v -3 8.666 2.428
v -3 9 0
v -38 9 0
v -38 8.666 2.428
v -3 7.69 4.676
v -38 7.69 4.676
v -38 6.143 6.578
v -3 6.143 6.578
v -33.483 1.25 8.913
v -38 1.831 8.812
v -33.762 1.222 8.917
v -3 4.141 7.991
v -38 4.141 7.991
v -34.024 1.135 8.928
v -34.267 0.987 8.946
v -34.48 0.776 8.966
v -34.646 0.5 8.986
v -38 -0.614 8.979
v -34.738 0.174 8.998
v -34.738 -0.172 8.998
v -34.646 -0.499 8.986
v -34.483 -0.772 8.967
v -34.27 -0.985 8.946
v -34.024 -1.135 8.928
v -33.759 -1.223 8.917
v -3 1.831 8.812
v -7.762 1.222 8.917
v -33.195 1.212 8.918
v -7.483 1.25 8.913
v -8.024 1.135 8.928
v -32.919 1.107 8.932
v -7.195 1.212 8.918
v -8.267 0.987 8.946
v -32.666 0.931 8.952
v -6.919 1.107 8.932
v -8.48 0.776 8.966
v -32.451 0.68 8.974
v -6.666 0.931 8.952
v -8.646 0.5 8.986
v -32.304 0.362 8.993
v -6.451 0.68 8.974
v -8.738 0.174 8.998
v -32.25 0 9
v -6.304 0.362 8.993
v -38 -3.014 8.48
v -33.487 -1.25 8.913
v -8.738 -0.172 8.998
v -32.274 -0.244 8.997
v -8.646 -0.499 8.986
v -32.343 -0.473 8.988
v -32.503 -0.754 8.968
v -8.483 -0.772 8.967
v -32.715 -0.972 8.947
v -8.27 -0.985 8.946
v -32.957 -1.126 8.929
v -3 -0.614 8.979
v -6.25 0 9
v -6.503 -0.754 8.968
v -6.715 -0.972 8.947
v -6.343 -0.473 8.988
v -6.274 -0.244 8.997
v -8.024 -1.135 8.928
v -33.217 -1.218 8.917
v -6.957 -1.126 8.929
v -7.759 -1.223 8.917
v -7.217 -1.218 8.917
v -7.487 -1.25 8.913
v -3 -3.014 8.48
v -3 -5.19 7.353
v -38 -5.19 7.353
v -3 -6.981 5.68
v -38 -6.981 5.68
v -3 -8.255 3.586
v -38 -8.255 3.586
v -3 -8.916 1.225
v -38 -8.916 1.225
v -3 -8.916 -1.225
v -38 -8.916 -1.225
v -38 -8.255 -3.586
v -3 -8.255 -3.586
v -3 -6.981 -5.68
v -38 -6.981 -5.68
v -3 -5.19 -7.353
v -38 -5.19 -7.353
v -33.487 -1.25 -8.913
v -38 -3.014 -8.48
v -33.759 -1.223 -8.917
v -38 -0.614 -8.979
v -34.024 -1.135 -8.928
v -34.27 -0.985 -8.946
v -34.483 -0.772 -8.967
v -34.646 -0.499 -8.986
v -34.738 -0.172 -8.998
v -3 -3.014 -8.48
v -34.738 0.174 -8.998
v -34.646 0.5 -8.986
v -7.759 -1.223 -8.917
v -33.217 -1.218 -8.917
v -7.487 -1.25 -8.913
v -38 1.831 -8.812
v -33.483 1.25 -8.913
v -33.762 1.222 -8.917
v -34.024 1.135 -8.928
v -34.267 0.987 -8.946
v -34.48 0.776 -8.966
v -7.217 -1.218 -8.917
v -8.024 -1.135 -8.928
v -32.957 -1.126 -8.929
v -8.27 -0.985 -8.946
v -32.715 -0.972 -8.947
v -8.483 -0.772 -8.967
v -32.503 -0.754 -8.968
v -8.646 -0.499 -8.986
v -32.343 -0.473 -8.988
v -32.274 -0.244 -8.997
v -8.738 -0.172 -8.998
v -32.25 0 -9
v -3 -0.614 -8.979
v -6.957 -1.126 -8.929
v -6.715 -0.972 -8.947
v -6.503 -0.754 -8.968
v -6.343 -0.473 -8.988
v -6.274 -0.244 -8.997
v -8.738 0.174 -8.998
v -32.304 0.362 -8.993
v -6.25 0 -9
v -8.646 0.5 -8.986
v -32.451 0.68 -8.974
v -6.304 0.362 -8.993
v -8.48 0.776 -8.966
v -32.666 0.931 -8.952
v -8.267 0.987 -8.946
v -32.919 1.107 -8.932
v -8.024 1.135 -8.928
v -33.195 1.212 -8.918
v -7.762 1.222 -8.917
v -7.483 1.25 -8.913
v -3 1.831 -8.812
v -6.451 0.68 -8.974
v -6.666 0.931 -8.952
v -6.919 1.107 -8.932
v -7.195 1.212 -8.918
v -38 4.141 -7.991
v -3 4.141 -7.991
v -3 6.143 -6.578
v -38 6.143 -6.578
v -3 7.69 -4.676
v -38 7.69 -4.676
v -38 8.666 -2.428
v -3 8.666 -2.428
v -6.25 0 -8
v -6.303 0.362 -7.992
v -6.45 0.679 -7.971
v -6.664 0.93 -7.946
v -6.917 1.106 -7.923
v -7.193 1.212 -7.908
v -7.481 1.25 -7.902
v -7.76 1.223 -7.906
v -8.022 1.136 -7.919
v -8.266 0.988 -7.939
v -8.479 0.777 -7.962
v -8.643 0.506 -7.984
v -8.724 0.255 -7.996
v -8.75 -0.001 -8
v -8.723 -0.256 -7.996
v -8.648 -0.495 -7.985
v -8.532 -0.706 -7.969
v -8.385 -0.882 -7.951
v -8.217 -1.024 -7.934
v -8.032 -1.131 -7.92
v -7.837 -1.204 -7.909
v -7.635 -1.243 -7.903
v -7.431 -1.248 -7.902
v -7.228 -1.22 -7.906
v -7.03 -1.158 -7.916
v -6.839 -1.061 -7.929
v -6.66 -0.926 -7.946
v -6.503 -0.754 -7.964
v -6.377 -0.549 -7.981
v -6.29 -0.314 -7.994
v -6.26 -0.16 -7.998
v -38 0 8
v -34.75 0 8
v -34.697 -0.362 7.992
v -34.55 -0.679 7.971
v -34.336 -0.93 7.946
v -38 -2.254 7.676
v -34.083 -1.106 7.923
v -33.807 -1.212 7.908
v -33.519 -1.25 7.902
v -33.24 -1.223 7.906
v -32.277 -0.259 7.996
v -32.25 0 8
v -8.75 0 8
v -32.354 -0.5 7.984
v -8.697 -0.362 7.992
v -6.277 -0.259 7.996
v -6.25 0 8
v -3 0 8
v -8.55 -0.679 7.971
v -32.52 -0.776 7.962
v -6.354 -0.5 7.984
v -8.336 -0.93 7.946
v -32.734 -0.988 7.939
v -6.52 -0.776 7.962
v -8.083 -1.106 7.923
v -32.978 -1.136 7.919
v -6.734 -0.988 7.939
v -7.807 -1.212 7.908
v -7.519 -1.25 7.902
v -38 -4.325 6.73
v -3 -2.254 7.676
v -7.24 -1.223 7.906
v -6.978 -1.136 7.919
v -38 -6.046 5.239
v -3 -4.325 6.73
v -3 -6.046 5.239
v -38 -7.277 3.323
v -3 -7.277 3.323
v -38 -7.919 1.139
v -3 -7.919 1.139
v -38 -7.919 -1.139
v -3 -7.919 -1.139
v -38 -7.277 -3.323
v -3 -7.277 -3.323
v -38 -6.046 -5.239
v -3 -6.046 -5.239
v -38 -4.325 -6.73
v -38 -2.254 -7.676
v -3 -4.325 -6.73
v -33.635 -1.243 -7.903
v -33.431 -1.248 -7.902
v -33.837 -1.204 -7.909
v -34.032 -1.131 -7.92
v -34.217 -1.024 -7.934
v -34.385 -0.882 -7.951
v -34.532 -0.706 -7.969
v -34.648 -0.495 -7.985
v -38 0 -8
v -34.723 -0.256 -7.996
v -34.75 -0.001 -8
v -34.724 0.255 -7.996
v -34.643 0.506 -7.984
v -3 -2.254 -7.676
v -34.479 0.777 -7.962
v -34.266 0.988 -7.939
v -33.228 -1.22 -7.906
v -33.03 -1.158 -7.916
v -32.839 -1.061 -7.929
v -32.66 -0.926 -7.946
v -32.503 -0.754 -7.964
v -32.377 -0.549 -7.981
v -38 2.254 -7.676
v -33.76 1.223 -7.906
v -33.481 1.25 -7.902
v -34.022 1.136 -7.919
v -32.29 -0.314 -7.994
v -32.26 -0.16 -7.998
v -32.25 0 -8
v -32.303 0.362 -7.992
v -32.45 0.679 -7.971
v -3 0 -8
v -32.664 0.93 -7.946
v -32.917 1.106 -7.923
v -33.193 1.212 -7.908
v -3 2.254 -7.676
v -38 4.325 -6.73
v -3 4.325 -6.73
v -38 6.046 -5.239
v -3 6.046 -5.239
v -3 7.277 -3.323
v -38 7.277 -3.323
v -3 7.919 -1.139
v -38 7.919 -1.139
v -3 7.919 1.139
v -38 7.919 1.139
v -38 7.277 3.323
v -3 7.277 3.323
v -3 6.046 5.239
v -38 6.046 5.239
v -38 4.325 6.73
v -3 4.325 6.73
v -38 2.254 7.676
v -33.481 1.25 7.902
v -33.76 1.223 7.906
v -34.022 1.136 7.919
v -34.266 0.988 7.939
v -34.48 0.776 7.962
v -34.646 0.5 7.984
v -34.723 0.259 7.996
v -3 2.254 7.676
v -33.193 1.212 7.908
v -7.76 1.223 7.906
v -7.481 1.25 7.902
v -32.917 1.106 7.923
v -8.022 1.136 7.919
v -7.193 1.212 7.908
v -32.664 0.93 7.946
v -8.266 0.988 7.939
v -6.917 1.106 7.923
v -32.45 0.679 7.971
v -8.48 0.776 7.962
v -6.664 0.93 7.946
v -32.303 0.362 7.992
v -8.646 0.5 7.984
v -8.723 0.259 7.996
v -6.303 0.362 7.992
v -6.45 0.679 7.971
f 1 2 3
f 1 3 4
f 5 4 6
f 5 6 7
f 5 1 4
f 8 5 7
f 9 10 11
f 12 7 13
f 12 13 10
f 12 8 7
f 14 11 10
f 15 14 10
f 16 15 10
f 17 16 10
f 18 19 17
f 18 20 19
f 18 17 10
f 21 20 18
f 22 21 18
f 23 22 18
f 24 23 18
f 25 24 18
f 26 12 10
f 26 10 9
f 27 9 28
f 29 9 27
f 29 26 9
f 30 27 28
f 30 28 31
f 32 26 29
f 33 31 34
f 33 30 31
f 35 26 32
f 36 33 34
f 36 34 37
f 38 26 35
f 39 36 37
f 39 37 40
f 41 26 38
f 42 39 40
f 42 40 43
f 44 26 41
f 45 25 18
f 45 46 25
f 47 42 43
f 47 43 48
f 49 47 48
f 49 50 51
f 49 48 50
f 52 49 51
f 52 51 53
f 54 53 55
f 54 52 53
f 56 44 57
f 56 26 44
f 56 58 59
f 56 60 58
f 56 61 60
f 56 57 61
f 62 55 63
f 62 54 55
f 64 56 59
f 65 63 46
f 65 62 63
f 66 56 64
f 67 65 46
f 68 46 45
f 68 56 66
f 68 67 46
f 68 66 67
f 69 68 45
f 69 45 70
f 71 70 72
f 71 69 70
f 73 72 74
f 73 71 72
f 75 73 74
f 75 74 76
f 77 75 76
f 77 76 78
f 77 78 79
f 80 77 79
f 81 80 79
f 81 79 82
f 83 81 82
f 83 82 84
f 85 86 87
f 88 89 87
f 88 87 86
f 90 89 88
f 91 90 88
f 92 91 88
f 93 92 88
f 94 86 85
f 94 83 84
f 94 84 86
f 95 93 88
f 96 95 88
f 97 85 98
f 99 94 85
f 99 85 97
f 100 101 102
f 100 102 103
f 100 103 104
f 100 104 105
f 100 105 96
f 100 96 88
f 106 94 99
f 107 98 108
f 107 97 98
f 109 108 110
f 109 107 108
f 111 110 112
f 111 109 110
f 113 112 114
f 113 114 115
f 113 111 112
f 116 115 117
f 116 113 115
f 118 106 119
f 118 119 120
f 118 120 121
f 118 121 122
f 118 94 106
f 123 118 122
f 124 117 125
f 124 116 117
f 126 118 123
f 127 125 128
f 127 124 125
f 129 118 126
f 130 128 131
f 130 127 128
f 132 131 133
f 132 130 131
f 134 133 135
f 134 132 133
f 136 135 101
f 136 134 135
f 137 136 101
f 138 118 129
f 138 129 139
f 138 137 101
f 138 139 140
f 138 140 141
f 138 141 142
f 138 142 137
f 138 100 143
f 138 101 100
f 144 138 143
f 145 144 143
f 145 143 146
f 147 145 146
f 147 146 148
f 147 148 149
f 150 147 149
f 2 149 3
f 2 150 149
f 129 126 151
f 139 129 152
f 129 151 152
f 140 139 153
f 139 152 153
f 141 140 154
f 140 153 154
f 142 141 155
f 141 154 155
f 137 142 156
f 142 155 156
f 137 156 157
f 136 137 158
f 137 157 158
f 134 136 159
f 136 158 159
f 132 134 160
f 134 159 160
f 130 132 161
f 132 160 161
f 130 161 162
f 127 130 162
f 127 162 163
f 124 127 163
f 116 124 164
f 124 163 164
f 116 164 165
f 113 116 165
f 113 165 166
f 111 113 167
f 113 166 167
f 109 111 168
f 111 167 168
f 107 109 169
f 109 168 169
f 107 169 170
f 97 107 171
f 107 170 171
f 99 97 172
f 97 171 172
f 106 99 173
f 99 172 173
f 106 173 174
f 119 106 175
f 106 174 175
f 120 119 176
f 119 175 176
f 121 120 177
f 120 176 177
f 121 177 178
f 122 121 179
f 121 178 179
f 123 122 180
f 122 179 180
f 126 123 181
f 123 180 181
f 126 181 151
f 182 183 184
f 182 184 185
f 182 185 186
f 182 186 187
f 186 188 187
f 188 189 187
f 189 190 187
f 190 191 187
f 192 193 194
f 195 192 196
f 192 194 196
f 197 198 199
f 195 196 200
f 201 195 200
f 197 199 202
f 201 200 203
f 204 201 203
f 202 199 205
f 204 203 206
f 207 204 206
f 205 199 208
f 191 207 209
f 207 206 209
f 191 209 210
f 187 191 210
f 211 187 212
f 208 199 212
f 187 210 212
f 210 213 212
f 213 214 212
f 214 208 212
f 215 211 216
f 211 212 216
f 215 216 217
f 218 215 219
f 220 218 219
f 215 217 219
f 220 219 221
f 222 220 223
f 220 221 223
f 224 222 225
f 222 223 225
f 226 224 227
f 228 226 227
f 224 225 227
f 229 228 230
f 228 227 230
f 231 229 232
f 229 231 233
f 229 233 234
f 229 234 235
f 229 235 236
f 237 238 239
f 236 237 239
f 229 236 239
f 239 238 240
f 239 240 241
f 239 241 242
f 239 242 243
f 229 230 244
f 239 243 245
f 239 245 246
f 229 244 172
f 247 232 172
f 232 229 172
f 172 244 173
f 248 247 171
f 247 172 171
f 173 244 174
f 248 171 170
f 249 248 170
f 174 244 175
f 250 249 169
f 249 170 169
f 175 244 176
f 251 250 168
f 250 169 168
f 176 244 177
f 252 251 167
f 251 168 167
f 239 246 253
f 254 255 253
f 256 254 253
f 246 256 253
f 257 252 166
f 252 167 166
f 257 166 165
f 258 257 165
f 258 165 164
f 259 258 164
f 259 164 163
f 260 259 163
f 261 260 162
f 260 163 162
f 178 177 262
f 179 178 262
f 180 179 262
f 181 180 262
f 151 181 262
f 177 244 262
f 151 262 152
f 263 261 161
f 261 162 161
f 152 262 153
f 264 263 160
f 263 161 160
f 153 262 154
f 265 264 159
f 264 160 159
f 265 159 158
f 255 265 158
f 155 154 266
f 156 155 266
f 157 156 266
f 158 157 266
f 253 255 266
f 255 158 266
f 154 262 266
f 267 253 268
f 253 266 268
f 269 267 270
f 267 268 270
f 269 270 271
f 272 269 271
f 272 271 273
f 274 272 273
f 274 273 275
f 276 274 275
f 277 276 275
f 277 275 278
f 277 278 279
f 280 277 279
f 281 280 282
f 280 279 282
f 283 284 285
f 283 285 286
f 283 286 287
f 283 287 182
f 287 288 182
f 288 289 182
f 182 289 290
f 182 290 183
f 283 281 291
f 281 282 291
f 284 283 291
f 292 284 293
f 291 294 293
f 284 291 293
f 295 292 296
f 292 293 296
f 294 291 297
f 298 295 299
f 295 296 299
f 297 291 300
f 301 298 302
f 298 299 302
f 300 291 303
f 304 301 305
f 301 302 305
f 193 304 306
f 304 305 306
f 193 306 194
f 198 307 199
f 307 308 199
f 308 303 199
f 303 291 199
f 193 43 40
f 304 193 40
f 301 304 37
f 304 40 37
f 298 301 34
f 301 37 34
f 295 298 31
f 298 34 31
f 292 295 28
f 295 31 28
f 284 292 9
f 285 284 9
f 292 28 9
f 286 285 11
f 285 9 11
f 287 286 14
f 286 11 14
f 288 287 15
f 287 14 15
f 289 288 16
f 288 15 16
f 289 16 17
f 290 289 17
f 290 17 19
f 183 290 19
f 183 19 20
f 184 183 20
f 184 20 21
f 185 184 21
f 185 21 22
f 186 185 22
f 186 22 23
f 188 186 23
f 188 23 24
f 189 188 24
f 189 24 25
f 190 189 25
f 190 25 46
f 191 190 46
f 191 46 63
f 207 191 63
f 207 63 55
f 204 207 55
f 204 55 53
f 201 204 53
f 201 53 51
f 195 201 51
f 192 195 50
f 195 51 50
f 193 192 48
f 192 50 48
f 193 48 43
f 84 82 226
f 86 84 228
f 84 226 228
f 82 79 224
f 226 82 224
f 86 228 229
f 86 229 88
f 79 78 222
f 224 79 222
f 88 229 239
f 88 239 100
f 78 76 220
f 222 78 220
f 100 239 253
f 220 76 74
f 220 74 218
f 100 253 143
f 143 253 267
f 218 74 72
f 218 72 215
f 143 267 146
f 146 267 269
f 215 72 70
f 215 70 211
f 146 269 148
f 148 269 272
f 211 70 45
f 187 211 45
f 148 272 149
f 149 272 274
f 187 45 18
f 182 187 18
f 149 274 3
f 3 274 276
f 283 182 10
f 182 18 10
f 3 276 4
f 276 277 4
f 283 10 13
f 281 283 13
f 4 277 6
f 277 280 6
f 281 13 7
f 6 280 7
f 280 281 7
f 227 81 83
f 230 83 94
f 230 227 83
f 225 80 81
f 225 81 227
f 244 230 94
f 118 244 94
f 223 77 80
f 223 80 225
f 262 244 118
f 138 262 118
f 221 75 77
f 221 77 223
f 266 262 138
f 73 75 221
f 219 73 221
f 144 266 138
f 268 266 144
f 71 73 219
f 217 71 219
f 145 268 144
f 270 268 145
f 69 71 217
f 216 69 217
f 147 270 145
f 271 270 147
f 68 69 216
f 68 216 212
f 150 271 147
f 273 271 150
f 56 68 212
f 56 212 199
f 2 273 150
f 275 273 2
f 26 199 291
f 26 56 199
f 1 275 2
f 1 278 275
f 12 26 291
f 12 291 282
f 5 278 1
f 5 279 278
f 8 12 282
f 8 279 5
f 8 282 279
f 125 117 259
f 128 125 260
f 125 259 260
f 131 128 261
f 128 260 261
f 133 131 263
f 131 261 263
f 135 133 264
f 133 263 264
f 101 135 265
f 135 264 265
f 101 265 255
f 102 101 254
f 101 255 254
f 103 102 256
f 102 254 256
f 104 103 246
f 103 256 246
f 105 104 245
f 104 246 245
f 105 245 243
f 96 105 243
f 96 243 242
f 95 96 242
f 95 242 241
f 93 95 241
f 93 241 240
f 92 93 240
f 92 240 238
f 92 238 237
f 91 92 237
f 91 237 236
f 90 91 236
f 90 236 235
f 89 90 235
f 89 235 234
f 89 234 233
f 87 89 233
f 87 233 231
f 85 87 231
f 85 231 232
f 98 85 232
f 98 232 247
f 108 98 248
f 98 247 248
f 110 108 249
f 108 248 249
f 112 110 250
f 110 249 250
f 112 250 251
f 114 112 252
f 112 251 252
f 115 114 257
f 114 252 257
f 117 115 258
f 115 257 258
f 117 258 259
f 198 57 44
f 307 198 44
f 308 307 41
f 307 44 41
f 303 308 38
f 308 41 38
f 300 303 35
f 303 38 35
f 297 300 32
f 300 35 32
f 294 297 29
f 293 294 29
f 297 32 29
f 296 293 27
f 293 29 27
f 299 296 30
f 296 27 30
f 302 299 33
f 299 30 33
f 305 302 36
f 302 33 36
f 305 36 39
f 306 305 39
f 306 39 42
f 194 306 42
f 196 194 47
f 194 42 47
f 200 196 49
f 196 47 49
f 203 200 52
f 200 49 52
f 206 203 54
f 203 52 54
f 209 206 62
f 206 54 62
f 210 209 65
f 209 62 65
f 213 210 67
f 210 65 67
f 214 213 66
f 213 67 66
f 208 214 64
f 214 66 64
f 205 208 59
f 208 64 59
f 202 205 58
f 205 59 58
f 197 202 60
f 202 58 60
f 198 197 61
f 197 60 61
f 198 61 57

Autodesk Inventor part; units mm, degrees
ref_plane "YZ Plane" through (0, 0, 0) normal (1, 0, 0) x (0, 1, 0)
ref_plane "XZ Plane" through (0, 0, 0) normal (0, 1, 0) x (-1, 0, 0)
sketch "ShaftProfile" plane through (0, 0, 0) normal (0, 0, 1) x (1, 0, 0)
  line L0 (-45.6, 0) -> (7.6, 0) construction
  line L1 (-38, 9) -> (-3, 9)
  line L2 (-3, 9) -> (-3, 0)
  line L3 (-38, 0) -> (-38, 9)
  line L4 (-38, 0) -> (-3, 0)
  point P0 (0, 0)
  dimension "d1" = 35
  dimension "d2" = 9
  dimension "d4" = 38
revolve "ShaftFeature" add sketch "ShaftProfile" angle 360 about axis through (-38, 0, 0) along (1, 0, 0)
sketch "Sketch2" plane through (-38, 0, 0) normal (-1, 0, 0) x (0, 0, 1)
  circle A0 centre (0, 0) radius 9 projected
hole "ShaftHoleFeature" at (-38, 0, 0) direction (1, 0, 0) diameter 16 end through all
ref_plane "MidSidePlane" through (0, 0, 10) normal (0, 0, 1) x (1, 0, 0)
sketch "CapHoles" plane through (0, 0, 10) normal (0, 0, 1) x (1, 0, 0)
  line L0 (-3, -9) -> (-3, 9) construction
  line L1 (-38, -9) -> (-38, 9) construction
  line L2 (-48, 0) -> (22, 0) construction
  circle A0 centre (-33.5, 0) radius 1.25
  circle A1 centre (-7.5, 0) radius 1.25
  dimension "d24" = 2.5
  dimension "d25" = 4.5
  dimension "d26" = 4.5
extrude "CapHolesFeature" cut sketch "CapHoles" against normal through all
equation "\"d26\" = d25"
properties part number "BackPair1PistonShaft"
